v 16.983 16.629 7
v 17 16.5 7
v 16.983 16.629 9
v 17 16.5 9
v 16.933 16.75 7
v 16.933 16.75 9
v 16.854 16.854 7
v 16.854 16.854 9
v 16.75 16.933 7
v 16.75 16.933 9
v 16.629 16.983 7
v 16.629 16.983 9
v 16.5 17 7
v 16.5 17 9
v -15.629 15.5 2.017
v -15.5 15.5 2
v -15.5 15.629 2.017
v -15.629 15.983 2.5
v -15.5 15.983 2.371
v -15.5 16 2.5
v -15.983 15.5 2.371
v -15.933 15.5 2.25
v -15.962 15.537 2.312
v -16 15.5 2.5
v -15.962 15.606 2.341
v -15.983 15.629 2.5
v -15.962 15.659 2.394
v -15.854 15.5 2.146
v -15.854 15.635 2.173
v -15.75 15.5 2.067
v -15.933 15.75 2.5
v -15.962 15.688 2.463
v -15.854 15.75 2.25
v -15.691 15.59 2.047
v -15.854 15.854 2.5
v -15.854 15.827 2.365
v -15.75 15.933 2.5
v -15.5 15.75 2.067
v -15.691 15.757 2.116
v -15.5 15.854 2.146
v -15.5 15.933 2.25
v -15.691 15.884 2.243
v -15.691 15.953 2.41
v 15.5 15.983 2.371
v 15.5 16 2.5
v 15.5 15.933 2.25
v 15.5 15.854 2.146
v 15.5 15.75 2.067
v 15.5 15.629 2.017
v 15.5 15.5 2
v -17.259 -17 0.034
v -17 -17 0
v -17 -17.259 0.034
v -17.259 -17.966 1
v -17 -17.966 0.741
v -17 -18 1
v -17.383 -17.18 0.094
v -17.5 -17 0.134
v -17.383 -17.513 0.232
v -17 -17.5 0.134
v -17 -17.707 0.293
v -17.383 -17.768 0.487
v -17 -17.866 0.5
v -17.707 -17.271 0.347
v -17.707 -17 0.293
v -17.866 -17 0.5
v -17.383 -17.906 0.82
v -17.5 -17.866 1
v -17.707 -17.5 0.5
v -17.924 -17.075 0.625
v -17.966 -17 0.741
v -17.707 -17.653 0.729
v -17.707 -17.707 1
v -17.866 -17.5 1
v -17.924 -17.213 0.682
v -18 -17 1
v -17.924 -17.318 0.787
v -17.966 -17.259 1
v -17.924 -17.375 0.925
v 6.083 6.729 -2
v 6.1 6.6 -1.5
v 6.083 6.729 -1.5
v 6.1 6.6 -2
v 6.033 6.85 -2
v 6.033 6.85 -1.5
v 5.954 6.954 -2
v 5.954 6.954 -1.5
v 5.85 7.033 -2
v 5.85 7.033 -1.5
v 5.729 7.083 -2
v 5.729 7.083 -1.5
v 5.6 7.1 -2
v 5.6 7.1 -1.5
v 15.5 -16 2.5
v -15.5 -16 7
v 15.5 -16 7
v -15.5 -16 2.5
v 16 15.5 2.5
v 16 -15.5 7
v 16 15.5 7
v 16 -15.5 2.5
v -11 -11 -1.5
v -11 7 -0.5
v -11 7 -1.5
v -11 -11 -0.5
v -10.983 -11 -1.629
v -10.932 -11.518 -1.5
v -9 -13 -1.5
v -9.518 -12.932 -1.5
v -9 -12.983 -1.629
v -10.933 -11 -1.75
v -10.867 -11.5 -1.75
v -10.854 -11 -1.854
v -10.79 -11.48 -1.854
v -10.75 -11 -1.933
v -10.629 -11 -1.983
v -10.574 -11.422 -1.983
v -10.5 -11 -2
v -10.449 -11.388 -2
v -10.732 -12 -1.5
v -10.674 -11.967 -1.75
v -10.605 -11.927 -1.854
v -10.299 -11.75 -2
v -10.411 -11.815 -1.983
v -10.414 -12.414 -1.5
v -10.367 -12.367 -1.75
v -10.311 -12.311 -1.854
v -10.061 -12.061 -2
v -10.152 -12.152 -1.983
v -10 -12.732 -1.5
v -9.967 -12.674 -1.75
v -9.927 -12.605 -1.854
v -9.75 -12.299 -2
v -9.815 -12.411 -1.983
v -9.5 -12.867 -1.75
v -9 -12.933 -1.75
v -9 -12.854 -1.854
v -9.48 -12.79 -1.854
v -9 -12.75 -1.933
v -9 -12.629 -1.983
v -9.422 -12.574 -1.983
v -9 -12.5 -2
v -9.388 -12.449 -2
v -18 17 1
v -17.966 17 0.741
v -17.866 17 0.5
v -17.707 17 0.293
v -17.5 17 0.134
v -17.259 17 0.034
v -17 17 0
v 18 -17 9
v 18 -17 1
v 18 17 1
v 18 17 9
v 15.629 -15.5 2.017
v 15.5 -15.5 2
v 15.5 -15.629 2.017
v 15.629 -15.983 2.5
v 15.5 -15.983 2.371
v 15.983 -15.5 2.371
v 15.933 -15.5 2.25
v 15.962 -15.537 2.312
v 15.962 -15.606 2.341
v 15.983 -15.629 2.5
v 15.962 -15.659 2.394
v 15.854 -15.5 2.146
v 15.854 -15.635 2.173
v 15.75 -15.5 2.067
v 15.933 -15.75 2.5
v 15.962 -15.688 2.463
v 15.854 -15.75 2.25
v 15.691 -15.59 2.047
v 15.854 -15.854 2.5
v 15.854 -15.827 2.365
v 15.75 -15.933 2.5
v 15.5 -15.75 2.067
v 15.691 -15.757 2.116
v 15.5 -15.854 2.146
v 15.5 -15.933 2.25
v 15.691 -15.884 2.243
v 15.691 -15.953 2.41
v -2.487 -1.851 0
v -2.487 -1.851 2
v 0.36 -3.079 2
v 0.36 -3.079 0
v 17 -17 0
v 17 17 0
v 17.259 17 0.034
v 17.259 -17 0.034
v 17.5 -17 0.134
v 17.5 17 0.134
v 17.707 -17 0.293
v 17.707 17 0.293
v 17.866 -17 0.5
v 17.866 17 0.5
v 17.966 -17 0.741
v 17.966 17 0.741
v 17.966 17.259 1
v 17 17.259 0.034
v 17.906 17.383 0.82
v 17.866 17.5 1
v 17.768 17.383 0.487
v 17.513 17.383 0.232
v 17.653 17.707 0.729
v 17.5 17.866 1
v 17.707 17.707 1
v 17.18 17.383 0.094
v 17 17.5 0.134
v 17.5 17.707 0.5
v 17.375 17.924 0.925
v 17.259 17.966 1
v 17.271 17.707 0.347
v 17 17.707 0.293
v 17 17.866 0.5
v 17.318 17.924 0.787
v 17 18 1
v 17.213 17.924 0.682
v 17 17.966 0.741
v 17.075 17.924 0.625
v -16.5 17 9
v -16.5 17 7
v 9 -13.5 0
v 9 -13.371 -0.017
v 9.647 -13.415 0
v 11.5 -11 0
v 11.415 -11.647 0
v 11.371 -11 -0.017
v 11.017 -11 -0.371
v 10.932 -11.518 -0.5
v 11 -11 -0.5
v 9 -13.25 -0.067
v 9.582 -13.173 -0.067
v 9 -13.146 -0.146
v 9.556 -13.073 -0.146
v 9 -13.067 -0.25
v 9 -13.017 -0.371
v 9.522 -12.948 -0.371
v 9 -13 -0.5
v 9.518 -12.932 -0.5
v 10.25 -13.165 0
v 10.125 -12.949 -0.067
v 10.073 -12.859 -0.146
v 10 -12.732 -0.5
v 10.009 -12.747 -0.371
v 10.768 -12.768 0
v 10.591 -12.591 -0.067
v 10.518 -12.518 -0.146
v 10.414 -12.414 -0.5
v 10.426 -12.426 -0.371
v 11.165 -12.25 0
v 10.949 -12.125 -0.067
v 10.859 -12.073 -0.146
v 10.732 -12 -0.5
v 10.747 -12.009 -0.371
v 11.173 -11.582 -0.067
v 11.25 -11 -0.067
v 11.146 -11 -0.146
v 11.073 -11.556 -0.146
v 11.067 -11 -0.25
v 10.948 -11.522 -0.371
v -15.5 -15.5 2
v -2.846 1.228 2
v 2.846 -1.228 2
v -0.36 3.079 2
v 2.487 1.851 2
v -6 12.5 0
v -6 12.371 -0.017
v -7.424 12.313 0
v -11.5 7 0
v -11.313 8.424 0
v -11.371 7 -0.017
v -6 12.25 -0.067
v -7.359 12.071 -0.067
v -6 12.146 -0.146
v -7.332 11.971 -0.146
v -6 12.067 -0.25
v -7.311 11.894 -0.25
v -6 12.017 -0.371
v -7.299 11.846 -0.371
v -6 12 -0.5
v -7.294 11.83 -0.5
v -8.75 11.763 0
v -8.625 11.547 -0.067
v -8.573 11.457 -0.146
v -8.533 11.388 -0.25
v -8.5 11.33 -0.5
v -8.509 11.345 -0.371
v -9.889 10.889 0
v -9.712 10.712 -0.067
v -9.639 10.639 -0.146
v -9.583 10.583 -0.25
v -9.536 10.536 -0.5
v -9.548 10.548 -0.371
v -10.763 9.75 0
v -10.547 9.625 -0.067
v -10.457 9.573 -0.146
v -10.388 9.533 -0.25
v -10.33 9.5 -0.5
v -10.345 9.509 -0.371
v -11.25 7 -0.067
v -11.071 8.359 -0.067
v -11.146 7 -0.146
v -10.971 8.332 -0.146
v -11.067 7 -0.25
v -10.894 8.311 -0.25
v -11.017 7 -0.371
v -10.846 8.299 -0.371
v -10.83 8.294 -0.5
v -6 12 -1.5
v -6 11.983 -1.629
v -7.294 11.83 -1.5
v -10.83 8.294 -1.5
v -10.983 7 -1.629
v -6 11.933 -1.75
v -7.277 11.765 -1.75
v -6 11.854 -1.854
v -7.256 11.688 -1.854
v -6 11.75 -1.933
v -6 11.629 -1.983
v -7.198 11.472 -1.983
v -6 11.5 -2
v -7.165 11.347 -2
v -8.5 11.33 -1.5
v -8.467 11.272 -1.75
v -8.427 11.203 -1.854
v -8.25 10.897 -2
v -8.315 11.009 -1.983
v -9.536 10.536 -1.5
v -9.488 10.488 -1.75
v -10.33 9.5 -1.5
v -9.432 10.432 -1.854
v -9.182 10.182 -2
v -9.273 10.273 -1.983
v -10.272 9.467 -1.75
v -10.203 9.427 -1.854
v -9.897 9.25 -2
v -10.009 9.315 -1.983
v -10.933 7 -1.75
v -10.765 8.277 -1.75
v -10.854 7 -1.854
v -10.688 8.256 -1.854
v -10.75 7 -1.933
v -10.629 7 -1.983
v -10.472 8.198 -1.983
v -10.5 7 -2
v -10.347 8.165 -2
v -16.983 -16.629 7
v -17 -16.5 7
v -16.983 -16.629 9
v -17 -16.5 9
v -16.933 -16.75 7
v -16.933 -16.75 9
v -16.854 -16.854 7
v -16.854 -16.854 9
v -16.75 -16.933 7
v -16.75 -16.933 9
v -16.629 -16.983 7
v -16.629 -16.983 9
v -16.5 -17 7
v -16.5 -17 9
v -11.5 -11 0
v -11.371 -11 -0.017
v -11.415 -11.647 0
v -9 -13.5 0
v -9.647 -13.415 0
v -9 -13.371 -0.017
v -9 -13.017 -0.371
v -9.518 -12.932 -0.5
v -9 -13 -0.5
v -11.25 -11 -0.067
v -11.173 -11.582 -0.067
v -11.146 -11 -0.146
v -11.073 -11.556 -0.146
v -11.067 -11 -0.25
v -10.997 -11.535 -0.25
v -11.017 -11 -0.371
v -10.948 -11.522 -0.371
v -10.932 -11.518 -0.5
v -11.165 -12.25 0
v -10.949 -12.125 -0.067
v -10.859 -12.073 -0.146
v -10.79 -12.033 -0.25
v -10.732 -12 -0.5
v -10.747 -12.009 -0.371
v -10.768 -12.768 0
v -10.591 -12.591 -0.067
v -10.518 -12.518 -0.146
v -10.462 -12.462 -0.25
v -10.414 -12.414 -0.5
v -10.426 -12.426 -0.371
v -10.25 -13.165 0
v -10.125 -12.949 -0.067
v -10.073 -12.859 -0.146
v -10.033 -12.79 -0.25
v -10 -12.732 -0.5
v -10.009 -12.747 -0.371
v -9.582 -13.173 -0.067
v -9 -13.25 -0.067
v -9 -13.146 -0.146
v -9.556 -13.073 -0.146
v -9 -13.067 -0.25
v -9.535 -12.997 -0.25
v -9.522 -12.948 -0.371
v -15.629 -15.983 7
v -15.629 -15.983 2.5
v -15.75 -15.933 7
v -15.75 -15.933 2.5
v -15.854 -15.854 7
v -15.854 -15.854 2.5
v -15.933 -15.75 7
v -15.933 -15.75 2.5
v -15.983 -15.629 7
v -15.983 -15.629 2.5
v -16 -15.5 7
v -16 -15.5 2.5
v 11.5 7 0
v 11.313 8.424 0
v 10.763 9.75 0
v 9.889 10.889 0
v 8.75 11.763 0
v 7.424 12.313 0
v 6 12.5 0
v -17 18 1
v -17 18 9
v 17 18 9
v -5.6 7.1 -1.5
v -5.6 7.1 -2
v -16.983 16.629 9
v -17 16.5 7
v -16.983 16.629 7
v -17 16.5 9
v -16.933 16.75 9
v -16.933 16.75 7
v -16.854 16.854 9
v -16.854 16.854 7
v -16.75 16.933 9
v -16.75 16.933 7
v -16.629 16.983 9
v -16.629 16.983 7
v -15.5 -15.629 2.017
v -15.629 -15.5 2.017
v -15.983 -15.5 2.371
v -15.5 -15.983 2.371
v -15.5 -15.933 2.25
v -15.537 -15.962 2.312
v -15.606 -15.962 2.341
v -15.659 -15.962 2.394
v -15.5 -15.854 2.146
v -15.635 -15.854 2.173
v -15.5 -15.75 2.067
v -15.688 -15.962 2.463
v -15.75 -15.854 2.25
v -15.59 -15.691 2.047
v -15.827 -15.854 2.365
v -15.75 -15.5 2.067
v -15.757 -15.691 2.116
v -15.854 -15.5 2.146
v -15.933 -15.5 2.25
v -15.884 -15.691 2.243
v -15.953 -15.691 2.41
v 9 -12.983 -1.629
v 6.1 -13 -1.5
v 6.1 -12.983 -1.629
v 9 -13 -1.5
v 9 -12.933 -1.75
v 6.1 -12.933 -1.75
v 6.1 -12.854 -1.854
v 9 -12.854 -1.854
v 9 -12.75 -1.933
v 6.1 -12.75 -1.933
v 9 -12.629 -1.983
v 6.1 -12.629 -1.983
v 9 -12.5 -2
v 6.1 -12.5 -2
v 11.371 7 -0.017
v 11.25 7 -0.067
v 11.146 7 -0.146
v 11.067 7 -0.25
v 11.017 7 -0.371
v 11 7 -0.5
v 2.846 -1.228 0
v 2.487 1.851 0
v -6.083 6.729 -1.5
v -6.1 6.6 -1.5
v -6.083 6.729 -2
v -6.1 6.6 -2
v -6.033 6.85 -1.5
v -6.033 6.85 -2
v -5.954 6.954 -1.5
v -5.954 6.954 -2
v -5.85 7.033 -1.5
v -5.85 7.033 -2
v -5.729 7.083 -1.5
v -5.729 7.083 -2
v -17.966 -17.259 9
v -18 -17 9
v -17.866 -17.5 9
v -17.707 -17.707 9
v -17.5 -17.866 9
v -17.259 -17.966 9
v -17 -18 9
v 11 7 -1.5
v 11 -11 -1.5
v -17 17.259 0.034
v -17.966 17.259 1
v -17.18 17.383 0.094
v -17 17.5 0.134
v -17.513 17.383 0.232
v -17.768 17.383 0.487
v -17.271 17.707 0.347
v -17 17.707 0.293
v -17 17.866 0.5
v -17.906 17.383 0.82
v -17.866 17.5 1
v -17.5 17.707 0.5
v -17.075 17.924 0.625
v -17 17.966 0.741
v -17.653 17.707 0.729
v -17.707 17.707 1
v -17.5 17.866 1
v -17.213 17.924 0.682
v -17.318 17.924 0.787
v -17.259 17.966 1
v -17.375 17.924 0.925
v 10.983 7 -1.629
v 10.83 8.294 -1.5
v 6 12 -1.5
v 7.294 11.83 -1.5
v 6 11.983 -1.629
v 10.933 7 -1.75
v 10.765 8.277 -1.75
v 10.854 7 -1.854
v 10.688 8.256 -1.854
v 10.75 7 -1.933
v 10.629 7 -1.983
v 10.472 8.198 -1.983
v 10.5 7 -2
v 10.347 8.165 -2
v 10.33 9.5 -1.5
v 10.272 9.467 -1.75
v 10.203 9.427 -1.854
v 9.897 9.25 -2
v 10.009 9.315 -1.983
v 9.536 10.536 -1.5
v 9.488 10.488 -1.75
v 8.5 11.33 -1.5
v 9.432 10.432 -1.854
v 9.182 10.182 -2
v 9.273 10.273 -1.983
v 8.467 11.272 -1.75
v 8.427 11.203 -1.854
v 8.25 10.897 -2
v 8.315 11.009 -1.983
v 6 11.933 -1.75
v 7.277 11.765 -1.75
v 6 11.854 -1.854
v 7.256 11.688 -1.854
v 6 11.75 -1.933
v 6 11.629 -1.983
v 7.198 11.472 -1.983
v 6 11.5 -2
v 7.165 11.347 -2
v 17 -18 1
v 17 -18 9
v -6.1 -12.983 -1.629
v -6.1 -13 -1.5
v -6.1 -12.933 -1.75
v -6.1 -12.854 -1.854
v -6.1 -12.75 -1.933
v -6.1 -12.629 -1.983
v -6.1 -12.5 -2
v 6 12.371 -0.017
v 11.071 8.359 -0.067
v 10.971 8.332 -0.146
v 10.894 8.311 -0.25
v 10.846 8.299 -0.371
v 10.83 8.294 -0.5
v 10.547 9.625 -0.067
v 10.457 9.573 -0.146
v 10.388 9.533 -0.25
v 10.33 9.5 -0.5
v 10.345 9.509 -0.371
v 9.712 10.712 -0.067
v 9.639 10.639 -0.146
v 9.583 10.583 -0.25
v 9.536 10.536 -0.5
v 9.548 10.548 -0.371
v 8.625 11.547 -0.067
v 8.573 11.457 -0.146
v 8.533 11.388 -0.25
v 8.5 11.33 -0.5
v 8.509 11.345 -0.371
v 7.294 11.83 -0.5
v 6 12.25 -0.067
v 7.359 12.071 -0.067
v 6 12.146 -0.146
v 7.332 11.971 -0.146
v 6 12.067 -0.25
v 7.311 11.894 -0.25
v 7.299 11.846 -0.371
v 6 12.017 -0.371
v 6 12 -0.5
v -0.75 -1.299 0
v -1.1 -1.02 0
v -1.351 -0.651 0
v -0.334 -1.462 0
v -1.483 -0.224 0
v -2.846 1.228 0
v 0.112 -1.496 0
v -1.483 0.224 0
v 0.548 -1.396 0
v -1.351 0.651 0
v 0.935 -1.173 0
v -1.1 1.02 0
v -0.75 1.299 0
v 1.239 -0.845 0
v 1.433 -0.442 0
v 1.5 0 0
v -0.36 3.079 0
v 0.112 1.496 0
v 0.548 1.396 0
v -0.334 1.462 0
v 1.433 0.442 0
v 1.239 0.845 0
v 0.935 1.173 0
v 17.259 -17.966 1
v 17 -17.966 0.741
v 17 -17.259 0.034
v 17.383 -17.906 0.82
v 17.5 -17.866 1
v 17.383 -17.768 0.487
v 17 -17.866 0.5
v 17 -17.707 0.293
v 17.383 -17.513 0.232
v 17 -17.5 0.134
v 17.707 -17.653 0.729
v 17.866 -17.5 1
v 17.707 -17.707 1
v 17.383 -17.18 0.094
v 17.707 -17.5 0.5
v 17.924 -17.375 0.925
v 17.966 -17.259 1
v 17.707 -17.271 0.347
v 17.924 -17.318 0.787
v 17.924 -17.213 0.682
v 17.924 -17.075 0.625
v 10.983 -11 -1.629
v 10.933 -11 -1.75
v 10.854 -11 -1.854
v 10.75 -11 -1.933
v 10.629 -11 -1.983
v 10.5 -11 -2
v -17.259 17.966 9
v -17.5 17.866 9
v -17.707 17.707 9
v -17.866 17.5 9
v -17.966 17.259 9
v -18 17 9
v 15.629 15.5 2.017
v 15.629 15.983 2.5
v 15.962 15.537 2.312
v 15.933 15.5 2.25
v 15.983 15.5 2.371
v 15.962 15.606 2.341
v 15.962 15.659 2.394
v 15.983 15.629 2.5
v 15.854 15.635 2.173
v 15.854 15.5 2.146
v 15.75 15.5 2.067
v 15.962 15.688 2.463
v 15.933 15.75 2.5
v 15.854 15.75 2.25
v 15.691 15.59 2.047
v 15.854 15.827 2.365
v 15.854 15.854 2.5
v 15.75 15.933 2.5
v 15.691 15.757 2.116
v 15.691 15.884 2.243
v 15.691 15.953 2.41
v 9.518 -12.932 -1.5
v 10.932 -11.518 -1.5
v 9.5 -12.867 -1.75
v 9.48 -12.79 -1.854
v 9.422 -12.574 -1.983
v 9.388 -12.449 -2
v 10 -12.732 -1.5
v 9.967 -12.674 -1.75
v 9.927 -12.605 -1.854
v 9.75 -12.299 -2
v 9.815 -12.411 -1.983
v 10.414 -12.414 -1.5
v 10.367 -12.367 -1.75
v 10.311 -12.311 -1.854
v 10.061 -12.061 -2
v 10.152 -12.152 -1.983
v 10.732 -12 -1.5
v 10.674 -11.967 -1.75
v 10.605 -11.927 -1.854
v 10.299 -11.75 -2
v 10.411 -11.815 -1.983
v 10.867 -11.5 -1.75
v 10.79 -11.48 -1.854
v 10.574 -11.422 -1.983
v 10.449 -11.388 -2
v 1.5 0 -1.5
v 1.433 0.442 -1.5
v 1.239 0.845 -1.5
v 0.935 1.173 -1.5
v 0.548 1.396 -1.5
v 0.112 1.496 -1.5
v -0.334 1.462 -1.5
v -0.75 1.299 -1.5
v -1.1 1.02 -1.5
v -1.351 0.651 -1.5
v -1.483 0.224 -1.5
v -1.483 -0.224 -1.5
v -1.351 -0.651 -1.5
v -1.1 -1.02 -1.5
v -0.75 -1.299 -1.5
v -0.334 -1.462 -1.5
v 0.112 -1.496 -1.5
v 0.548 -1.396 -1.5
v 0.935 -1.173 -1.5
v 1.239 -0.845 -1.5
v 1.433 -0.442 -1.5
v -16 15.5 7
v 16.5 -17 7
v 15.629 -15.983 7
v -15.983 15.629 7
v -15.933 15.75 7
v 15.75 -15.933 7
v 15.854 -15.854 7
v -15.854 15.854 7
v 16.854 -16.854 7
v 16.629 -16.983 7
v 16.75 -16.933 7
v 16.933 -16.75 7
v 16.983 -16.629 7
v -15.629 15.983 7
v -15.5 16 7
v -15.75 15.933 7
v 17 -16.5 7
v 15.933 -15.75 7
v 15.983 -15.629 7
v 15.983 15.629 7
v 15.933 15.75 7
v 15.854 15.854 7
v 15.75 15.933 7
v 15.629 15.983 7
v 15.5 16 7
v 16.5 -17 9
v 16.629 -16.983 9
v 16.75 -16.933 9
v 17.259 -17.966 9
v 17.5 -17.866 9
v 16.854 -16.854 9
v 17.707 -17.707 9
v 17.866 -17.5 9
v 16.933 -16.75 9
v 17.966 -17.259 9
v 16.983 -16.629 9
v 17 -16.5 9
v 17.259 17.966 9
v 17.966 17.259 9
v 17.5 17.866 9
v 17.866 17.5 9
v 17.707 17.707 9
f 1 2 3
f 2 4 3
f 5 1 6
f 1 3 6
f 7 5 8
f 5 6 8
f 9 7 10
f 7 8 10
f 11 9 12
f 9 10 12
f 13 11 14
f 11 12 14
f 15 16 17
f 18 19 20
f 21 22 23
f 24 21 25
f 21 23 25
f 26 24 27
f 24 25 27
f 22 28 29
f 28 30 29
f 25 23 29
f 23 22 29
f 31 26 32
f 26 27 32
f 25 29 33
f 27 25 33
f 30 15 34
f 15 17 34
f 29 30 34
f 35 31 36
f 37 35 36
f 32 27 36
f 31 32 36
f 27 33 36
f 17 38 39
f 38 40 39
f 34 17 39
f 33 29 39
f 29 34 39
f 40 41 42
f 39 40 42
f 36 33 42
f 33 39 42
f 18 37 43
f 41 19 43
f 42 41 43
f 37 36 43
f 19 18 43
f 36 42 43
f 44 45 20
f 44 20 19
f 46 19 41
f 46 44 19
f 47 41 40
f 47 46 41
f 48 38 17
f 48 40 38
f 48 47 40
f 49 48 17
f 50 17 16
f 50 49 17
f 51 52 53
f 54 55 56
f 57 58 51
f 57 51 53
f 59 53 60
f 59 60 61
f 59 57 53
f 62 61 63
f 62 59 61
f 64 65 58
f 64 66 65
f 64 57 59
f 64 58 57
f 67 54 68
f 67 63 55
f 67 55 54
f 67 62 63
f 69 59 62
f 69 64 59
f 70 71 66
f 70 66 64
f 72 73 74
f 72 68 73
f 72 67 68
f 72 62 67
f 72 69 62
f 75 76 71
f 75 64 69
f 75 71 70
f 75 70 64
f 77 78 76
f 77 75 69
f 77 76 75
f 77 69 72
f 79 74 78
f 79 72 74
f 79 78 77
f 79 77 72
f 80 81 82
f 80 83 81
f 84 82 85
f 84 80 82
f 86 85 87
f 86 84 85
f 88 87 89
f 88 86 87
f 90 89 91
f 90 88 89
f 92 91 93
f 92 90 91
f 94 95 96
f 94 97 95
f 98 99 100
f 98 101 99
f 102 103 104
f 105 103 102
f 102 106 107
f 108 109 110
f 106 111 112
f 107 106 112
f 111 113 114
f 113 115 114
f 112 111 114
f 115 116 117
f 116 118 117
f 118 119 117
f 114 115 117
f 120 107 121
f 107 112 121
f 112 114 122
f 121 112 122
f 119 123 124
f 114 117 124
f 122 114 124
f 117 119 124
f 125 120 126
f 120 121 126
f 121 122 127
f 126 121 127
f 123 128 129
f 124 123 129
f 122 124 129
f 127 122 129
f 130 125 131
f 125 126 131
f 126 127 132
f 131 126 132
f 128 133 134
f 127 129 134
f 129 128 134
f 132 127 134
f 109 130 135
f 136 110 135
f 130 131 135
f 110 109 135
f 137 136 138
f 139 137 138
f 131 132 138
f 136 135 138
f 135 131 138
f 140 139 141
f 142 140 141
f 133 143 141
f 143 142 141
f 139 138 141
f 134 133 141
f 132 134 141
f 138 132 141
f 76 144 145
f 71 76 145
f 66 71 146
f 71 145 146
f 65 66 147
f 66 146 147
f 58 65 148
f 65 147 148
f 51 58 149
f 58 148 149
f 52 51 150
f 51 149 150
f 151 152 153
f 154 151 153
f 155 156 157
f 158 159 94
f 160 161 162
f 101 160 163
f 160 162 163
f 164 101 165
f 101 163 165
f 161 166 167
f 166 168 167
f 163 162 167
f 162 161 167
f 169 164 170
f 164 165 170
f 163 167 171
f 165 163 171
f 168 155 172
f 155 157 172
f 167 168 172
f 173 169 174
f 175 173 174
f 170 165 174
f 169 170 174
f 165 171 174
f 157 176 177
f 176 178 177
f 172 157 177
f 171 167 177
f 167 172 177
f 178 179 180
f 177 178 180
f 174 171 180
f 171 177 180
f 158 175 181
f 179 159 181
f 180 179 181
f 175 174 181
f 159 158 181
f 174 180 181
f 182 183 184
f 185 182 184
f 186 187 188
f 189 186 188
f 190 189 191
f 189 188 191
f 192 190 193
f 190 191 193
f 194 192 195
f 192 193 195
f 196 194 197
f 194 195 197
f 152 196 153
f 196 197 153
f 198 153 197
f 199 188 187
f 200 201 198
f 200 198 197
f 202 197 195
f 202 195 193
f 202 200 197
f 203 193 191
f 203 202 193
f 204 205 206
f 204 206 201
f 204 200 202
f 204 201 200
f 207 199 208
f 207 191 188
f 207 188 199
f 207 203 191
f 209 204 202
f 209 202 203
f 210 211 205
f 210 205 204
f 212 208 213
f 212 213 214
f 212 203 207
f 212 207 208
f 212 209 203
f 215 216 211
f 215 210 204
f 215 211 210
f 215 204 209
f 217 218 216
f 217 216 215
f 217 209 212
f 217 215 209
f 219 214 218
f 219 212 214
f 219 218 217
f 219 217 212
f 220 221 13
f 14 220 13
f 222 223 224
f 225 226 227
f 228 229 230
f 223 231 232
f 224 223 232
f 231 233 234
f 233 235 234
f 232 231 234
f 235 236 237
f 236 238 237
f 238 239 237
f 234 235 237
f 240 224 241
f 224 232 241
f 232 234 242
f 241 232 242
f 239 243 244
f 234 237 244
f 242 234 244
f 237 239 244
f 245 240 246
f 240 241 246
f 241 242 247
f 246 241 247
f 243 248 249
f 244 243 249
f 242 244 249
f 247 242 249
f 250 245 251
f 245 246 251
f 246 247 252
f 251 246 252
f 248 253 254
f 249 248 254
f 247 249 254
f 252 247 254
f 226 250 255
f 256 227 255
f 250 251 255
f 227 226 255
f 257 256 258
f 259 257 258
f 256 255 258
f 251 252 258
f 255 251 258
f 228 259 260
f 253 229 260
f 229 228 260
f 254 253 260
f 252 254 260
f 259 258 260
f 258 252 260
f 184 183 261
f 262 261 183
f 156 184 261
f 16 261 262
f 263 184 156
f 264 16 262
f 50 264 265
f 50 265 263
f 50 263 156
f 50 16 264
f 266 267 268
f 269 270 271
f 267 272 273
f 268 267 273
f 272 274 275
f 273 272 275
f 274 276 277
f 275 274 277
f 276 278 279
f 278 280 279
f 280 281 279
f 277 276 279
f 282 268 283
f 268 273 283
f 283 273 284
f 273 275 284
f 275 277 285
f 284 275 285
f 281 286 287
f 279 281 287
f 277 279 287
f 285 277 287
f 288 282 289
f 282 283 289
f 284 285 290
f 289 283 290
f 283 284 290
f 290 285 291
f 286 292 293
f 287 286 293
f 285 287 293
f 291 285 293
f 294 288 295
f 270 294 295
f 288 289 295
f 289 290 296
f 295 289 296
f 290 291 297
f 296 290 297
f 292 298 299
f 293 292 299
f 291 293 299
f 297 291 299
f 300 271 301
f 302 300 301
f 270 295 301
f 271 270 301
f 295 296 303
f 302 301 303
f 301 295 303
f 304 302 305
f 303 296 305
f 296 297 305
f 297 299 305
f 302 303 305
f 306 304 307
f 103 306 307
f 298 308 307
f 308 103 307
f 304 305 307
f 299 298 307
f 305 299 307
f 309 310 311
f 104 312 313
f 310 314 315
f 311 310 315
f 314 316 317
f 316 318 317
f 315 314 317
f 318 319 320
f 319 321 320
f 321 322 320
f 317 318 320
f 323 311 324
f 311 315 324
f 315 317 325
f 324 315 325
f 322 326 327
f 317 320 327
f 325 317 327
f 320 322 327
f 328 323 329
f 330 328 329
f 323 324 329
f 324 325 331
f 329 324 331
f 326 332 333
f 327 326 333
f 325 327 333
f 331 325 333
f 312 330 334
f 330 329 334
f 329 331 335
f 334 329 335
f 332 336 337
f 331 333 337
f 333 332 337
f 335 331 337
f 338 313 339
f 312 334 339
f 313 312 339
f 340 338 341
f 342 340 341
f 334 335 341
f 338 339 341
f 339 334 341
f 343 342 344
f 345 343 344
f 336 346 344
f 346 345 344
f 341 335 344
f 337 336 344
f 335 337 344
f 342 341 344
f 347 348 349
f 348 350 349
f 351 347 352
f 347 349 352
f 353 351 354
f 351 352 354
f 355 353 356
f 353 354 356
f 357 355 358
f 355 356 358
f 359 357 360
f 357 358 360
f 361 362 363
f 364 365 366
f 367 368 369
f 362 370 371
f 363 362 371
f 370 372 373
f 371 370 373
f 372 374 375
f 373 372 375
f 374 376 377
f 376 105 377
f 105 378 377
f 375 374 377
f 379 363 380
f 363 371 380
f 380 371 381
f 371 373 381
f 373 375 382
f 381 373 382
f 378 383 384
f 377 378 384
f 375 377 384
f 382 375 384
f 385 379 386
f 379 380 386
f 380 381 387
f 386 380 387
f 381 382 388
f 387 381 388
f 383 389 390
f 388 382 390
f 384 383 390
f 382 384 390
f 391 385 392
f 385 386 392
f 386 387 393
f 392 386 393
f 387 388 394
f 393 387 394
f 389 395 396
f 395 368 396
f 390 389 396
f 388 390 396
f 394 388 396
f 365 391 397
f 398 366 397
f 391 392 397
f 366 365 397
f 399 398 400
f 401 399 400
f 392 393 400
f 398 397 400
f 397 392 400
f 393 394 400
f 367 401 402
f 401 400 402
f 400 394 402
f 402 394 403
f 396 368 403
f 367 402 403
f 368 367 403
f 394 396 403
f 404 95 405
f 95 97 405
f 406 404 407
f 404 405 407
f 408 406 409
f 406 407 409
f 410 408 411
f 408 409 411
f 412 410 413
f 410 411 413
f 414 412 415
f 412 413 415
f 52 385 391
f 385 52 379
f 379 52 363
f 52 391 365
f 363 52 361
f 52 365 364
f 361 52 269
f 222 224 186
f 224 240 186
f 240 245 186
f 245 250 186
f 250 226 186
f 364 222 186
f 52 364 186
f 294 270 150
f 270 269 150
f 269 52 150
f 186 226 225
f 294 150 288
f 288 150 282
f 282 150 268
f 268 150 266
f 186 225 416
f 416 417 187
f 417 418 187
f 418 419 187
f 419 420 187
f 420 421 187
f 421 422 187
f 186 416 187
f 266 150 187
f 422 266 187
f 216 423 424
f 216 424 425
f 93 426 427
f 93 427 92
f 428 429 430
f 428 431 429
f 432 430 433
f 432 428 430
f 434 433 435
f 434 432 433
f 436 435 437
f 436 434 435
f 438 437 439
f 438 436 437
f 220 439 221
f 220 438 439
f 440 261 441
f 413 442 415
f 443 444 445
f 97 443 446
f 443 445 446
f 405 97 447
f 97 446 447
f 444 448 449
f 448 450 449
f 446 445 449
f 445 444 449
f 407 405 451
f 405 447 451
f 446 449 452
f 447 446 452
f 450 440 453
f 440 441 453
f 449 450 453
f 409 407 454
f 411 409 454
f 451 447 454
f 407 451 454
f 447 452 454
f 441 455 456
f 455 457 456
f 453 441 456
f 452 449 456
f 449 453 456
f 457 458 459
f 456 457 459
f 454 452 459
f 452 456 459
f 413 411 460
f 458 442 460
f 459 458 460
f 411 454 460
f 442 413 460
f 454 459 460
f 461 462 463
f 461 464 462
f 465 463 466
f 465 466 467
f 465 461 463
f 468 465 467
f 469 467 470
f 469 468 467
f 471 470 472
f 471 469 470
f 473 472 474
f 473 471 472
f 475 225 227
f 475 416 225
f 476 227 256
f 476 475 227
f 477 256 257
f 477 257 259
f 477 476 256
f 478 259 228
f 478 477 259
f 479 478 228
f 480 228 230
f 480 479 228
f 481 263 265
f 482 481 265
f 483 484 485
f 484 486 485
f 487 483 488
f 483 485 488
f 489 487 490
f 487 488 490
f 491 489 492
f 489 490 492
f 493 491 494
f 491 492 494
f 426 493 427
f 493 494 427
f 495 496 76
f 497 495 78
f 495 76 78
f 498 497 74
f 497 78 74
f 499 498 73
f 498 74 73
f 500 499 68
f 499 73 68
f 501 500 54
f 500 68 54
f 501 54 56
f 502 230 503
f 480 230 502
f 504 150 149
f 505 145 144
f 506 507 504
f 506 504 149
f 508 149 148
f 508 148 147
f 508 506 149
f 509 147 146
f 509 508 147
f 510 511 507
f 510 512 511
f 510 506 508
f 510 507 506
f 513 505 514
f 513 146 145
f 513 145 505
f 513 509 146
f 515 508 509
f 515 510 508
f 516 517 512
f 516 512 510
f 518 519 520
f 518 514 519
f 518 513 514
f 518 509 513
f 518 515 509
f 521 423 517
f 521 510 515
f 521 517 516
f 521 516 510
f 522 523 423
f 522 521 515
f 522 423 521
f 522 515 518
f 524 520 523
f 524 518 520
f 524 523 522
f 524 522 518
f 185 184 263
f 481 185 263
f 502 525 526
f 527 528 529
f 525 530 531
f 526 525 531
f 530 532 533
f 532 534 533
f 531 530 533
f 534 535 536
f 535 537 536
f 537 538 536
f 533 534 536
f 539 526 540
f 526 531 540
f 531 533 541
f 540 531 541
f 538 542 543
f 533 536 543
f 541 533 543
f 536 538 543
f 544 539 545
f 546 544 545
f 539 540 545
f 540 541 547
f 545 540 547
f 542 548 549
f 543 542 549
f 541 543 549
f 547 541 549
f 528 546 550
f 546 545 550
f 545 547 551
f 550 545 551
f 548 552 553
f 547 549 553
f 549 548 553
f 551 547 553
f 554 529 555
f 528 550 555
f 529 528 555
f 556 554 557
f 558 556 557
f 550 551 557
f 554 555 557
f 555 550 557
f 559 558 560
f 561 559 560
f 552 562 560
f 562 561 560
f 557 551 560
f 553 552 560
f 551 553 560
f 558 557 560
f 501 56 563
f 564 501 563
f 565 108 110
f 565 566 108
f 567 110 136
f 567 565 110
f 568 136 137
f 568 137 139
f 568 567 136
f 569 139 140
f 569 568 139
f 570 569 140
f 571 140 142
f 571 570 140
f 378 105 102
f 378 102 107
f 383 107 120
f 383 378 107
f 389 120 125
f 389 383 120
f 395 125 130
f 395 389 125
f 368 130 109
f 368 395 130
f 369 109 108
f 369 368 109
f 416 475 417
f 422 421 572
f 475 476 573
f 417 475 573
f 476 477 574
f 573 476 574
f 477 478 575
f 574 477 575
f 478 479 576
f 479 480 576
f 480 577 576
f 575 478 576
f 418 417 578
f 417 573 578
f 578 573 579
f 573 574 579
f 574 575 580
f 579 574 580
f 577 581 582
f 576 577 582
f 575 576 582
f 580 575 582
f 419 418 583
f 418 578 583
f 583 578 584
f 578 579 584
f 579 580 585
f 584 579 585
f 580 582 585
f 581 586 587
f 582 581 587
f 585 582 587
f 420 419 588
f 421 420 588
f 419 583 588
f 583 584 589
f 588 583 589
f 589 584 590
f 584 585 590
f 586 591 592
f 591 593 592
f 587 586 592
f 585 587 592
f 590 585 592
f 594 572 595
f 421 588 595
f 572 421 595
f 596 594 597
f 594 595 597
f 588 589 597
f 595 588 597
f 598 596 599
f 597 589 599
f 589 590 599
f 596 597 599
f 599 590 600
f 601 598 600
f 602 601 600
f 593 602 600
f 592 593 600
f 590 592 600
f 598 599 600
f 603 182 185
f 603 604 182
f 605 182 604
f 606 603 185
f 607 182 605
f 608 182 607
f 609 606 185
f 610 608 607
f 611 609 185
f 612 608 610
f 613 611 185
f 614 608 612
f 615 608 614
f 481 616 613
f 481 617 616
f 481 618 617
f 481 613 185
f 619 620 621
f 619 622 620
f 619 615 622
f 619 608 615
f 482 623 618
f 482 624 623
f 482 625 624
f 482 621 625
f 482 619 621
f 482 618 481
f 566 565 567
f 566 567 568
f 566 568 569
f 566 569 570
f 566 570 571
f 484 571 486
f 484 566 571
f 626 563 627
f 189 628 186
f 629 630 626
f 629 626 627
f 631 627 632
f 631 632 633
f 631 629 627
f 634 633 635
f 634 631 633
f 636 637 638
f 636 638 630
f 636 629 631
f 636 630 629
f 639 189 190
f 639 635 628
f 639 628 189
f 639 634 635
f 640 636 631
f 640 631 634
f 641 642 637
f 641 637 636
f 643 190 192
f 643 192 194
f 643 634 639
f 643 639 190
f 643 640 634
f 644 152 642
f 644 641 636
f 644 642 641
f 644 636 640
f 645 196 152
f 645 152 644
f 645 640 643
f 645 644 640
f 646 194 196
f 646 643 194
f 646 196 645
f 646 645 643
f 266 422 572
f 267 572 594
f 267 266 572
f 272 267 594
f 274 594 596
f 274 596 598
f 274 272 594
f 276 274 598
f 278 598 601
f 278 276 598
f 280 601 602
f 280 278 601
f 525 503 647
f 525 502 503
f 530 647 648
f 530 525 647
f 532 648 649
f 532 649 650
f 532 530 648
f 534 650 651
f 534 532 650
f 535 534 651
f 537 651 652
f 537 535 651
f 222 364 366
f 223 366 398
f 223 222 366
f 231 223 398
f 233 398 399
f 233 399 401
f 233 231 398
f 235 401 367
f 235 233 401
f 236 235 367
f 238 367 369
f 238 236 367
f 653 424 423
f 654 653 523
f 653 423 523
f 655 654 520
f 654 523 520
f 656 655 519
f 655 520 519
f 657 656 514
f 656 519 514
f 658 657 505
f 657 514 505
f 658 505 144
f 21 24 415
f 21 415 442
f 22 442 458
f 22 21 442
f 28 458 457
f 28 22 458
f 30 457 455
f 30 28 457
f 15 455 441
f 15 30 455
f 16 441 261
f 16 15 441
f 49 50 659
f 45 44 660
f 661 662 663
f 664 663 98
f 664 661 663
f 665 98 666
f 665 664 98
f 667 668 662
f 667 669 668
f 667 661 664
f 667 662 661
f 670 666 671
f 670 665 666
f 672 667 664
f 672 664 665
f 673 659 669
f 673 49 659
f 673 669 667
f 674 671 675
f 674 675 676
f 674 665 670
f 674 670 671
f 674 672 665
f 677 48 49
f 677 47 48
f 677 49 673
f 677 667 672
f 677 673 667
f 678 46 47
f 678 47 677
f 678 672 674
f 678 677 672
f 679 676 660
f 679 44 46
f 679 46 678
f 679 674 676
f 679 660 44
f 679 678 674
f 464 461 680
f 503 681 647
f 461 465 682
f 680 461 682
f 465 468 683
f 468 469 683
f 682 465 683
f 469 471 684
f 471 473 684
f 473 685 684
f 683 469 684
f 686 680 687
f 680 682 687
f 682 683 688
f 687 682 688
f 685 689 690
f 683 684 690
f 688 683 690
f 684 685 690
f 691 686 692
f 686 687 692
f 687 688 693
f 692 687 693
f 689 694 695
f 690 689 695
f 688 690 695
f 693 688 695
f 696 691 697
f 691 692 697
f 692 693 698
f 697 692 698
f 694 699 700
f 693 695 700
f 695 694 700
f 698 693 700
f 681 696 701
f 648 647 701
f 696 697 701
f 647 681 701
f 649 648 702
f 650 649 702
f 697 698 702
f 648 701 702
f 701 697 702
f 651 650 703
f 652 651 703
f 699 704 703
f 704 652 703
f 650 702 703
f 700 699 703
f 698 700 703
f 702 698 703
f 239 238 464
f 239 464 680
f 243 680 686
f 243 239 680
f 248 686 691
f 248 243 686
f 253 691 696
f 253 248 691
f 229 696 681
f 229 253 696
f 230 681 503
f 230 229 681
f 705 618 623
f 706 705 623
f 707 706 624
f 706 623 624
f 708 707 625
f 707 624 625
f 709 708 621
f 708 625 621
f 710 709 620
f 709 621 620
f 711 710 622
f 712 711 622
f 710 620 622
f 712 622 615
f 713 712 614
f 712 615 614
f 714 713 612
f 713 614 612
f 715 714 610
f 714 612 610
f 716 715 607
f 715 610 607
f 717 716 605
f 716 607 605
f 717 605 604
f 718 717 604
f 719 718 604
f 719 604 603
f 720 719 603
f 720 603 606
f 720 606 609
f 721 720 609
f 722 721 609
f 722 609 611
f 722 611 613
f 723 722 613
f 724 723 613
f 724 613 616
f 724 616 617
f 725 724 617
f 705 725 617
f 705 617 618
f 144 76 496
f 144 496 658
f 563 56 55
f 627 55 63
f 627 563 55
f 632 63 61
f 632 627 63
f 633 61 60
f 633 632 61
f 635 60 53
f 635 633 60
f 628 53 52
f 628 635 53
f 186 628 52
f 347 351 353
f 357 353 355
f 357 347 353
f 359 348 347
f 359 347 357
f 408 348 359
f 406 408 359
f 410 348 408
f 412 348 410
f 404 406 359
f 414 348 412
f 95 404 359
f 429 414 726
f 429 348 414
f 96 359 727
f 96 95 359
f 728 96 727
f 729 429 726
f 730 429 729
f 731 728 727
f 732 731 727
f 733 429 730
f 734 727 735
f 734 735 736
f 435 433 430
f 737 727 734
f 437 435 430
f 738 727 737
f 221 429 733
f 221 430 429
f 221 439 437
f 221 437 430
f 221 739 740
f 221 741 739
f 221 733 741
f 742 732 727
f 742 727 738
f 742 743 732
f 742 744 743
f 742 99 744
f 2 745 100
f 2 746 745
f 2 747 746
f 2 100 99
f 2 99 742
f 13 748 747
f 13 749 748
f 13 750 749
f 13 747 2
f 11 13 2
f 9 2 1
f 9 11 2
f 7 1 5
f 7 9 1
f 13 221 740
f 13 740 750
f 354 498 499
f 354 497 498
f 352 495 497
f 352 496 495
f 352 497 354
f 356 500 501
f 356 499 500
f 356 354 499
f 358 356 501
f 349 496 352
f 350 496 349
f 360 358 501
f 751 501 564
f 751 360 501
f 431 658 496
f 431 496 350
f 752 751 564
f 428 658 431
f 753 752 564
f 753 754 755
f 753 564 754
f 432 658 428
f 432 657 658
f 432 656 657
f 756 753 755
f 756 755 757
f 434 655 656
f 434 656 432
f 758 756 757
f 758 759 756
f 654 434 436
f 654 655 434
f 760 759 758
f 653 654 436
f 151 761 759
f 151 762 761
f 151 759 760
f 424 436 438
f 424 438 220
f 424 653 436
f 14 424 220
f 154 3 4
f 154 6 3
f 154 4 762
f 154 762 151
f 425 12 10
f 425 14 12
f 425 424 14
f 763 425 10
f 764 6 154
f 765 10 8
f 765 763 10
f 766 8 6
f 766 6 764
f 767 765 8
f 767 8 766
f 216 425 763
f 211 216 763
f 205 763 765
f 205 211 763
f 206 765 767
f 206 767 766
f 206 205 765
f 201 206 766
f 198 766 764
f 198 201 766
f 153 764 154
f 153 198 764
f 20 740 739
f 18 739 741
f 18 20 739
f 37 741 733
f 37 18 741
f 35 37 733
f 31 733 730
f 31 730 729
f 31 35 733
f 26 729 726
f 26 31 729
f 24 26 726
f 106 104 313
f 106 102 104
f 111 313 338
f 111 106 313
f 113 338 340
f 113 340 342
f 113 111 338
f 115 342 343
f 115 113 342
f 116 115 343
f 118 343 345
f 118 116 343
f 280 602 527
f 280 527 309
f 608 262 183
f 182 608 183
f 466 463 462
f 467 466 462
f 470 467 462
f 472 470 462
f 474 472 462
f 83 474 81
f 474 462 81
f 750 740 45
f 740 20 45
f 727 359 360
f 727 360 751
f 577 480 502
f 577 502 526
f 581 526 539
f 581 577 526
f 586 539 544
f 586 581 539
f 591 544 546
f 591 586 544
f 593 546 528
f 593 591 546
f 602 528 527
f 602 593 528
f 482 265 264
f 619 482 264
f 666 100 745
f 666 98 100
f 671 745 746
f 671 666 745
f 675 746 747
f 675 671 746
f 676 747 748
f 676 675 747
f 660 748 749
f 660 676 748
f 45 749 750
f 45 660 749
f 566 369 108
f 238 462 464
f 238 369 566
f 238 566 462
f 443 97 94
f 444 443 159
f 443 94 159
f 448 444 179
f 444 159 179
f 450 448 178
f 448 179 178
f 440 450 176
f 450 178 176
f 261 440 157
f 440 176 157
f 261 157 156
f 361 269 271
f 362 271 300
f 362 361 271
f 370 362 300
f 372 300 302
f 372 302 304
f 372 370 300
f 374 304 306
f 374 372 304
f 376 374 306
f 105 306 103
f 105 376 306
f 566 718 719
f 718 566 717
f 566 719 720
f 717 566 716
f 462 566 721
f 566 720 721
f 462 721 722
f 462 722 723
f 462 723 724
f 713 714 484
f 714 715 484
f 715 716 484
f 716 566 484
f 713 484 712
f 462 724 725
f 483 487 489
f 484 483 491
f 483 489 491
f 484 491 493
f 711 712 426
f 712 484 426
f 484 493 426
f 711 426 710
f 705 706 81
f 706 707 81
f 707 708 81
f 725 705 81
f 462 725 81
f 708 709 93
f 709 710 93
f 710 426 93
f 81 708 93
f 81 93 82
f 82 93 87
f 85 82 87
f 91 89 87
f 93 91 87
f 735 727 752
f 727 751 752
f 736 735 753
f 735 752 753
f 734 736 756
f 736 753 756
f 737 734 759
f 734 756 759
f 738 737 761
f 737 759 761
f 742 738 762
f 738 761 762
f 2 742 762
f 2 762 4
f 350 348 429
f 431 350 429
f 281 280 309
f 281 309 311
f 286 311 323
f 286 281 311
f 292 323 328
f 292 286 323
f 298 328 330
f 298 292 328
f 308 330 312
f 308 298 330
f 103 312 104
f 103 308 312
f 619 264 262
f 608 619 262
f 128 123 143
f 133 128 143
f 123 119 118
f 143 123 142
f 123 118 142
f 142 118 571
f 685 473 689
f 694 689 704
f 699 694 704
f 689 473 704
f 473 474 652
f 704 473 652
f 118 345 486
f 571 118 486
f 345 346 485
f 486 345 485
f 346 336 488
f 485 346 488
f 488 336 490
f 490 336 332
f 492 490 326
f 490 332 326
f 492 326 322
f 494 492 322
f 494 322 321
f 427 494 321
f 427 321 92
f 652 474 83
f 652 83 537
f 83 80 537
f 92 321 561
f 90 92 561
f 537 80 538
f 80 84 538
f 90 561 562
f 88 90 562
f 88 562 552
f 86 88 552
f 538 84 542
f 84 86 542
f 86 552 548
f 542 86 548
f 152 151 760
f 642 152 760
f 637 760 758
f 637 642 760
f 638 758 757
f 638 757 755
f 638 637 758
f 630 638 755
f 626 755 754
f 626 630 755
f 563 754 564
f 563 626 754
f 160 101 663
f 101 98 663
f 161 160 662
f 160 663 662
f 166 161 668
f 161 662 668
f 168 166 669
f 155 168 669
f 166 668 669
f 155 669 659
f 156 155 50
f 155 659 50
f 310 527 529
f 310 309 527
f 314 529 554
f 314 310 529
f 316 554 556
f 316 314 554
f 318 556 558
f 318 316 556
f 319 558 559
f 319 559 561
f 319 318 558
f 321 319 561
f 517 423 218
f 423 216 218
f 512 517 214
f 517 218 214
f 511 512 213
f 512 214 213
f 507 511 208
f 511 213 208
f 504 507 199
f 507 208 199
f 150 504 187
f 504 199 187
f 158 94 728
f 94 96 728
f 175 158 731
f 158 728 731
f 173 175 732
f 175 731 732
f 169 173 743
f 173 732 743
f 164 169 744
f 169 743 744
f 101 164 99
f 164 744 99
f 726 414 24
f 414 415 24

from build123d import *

# Parameters (mm, degrees)
F1_W         = 36
F1_H         = 36
F2_DEPTH     = 9
F3_T         = -2
F4_START     = 7
F0_W         = 34
F0_H         = 34
F4_DEPTH     = 3
F5_R         = 1
F6_R         = 0.5
F7_T1_DEPTH  = 10.5
F7_S5_W      = 1
F7_S5_H      = 1
F7_T6_DEPTH  = 1
F7_S11_W     = 1
F7_S11_H     = 1
F7_T12_DEPTH = 1
F7_S17_W     = 1
F7_S17_H     = 1
F7_T18_DEPTH = 1
F7_S23_W     = 1
F7_S23_H     = 1
F7_T24_DEPTH = 1
F9_DEPTH     = 2
F11_START    = -1.5
F10_W        = 12.2
F10_H        = 20.1
F11_DEPTH    = 2.5
F13_DEPTH    = 2
F14_R        = 1.5
F15_DEPTH    = 4.001
F16_R        = 0.5
F17_R        = 0.5


# Not quite as in the source:
# - a fillet or chamfer that OpenCascade refuses, or shapes differently, is made with other operations: its cross-section is extruded or revolved along the edge and cut away or added


with BuildPart() as f2:
    # F1 (on Top) → F2 (new body)
    with BuildSketch(Plane.XY):
        Rectangle(F1_W, F1_H)
    extrude(amount=F2_DEPTH)

    # F3
    f3_openings = [f2.faces().sort_by_distance(p)[0] for p in [
        (0, 0, 9),
    ]]
    offset(amount=F3_T, openings=f3_openings)

    # F0 (on Top) → F4 (cut)
    with BuildSketch(Plane.XY.offset(F4_START)):
        Rectangle(F0_W, F0_H)
    extrude(amount=F4_DEPTH, mode=Mode.SUBTRACT)

    # F5
    f5_edges = [f2.edges().sort_by_distance(p)[0] for p in [
        (18, 0, 0),
        (0, 18, 0),
        (-18, 0, 0),
        (0, -18, 0),
    ]]
    fillet(f5_edges, radius=F5_R)

    # F6
    f6_edges = [f2.edges().sort_by_distance(p)[0] for p in [
        (0, 16, 2),
        (-16, 0, 2),
        (0, -16, 2),
        (16, 0, 2),
        (-16, 16, 4.5),
        (16, 16, 4.5),
        (17, 17, 8),
        (17, -17, 8),
        (16, -16, 4.5),
        (-17, -17, 8),
        (-16, -16, 4.5),
        (-17, 17, 8),
    ]]
    fillet(f6_edges, radius=F6_R)

    # F7: fillet of radius 1 on 4 edges, made by hand

    # F7_s2 → F7_t1 (cut)
    with BuildSketch(Plane.XY.offset(1)):
        with BuildLine():
            ThreePointArc((-18, -17), (-17.7071067812, -17.7071067812), (-17, -18))
            Line((-17, -18), (-18, -18))
            Line((-18, -18), (-18, -17))
        make_face()
        with BuildLine():
            ThreePointArc((17, 18), (17.7071067812, 17.7071067812), (18, 17))
            Line((18, 17), (18, 18))
            Line((18, 18), (17, 18))
        make_face()
        with BuildLine():
            ThreePointArc((18, -17), (17.7071067812, -17.7071067812), (17, -18))
            Line((17, -18), (18, -18))
            Line((18, -18), (18, -17))
        make_face()
        with BuildLine():
            ThreePointArc((-17, 18), (-17.7071067812, 17.7071067812), (-18, 17))
            Line((-18, 17), (-18, 18))
            Line((-18, 18), (-17, 18))
        make_face()
    extrude(amount=F7_T1_DEPTH, mode=Mode.SUBTRACT)


with BuildPart() as f7_tool4:
    # F7_s5 → F7_t6 (new body)
    with BuildSketch(Plane.XZ.offset(-17)):
        with Locations((-17.5, 0.5)):
            Rectangle(F7_S5_W, F7_S5_H)
    extrude(amount=-F7_T6_DEPTH)

    # F7_s7 → F7_t8 (revolve, cut)
    with BuildSketch(Plane(origin=(-17, 17, 1), x_dir=(0.7071067812, 0, 0.7071067812), z_dir=(-0.7071067812, 0, 0.7071067812))):
        with BuildLine():
            ThreePointArc((0, -1), (1, 0), (0, 1))
            Line((0, 1), (0, -1))
        make_face()
    revolve(axis=Axis((-17, 17, 1), (0, 1, 0)), mode=Mode.SUBTRACT)


with BuildPart() as f2_1:
    add(f2.part)

    # F7_t3: cut F7_tool4
    add(f7_tool4.part, mode=Mode.SUBTRACT)


with BuildPart() as f7_tool10:
    # F7_s11 → F7_t12 (new body)
    with BuildSketch(Plane.YZ.offset(17)):
        with Locations((-17.5, 0.5)):
            Rectangle(F7_S11_W, F7_S11_H)
    extrude(amount=F7_T12_DEPTH)

    # F7_s13 → F7_t14 (revolve, cut)
    with BuildSketch(Plane(origin=(17, -17, 1), x_dir=(0, 0.7071067812, 0.7071067812), z_dir=(0, 0.7071067812, -0.7071067812))):
        with BuildLine():
            ThreePointArc((0, -1), (1, 0), (0, 1))
            Line((0, 1), (0, -1))
        make_face()
    revolve(axis=Axis((17, -17, 1), (1, 0, 0)), mode=Mode.SUBTRACT)


with BuildPart() as f2_2:
    add(f2_1.part)

    # F7_t9: cut F7_tool10
    add(f7_tool10.part, mode=Mode.SUBTRACT)


with BuildPart() as f7_tool16:
    # F7_s17 → F7_t18 (new body)
    with BuildSketch(Plane.XZ.offset(-17)):
        with Locations((17.5, 0.5)):
            Rectangle(F7_S17_W, F7_S17_H)
    extrude(amount=-F7_T18_DEPTH)

    # F7_s19 → F7_t20 (revolve, cut)
    with BuildSketch(Plane(origin=(17, 17, 1), x_dir=(-0.7071067812, 0, 0.7071067812), z_dir=(-0.7071067812, 0, -0.7071067812))):
        with BuildLine():
            ThreePointArc((0, -1), (1, 0), (0, 1))
            Line((0, 1), (0, -1))
        make_face()
    revolve(axis=Axis((17, 17, 1), (0, 1, 0)), mode=Mode.SUBTRACT)


with BuildPart() as f2_3:
    add(f2_2.part)

    # F7_t15: cut F7_tool16
    add(f7_tool16.part, mode=Mode.SUBTRACT)


with BuildPart() as f7_tool22:
    # F7_s23 → F7_t24 (new body)
    with BuildSketch(Plane.YZ.offset(-17)):
        with Locations((-17.5, 0.5)):
            Rectangle(F7_S23_W, F7_S23_H)
    extrude(amount=-F7_T24_DEPTH)

    # F7_s25 → F7_t26 (revolve, cut)
    with BuildSketch(Plane(origin=(-17, -17, 1), x_dir=(0, 0.7071067812, 0.7071067812), z_dir=(0, -0.7071067812, 0.7071067812))):
        with BuildLine():
            ThreePointArc((0, -1), (1, 0), (0, 1))
            Line((0, 1), (0, -1))
        make_face()
    revolve(axis=Axis((-17, -17, 1), (-1, 0, 0)), mode=Mode.SUBTRACT)


with BuildPart() as f2_4:
    add(f2_3.part)

    # F7_t21: cut F7_tool22
    add(f7_tool22.part, mode=Mode.SUBTRACT)

    # F8 (on Top) → F9 (join)
    with BuildSketch(Plane.XY):
        with BuildLine():
            ThreePointArc((-11, -11), (-10.4142135624, -12.4142135624), (-9, -13))
            Line((-9, -13), (9, -13))
            ThreePointArc((9, -13), (10.4142135624, -12.4142135624), (11, -11))
            Line((11, -11), (11, 7))
            ThreePointArc((11, 7), (9.5355339059, 10.5355339059), (6, 12))
            Line((6, 12), (-6, 12))
            ThreePointArc((-6, 12), (-9.5355339059, 10.5355339059), (-11, 7))
            Line((-11, 7), (-11, -11))
        make_face()
    extrude(amount=-F9_DEPTH)

    # F10 (on Top) → F11 (cut)
    with BuildSketch(Plane.XY.offset(F11_START)):
        with Locations((0, -2.95)):
            Rectangle(F10_W, F10_H)
    extrude(amount=-F11_DEPTH, mode=Mode.SUBTRACT)

    # F12 (on face) → F13 (cut)
    with BuildSketch(Plane.XY.offset(2)):
        Polygon((-0.3596221451, 3.0790699753), (-2.8463638912, 1.2280930742), (-2.4867417461, -1.850976901), (0.3596221451, -3.0790699753), (2.8463638912, -1.2280930742), (2.4867417461, 1.850976901), align=None)
    extrude(amount=-F13_DEPTH, mode=Mode.SUBTRACT)

    # F14 (on face) → F15 (cut, through all)
    with BuildSketch(Plane.XY.offset(2)):
        Circle(F14_R)
    extrude(amount=-F15_DEPTH, mode=Mode.SUBTRACT)

    # F16
    f16_edges = [f2_4.edges().sort_by_distance(p)[0] for p in [
        (11, -2, 0),
        (6.1, 7.1, -1.75),
        (-6.1, 7.1, -1.75),
    ]]
    fillet(f16_edges, radius=F16_R)

    # F17
    f17_edges = [f2_4.edges().sort_by_distance(p)[0] for p in [
        (7.55, -13, -2),
    ]]
    fillet(f17_edges, radius=F17_R)


solid = f2_4.part
